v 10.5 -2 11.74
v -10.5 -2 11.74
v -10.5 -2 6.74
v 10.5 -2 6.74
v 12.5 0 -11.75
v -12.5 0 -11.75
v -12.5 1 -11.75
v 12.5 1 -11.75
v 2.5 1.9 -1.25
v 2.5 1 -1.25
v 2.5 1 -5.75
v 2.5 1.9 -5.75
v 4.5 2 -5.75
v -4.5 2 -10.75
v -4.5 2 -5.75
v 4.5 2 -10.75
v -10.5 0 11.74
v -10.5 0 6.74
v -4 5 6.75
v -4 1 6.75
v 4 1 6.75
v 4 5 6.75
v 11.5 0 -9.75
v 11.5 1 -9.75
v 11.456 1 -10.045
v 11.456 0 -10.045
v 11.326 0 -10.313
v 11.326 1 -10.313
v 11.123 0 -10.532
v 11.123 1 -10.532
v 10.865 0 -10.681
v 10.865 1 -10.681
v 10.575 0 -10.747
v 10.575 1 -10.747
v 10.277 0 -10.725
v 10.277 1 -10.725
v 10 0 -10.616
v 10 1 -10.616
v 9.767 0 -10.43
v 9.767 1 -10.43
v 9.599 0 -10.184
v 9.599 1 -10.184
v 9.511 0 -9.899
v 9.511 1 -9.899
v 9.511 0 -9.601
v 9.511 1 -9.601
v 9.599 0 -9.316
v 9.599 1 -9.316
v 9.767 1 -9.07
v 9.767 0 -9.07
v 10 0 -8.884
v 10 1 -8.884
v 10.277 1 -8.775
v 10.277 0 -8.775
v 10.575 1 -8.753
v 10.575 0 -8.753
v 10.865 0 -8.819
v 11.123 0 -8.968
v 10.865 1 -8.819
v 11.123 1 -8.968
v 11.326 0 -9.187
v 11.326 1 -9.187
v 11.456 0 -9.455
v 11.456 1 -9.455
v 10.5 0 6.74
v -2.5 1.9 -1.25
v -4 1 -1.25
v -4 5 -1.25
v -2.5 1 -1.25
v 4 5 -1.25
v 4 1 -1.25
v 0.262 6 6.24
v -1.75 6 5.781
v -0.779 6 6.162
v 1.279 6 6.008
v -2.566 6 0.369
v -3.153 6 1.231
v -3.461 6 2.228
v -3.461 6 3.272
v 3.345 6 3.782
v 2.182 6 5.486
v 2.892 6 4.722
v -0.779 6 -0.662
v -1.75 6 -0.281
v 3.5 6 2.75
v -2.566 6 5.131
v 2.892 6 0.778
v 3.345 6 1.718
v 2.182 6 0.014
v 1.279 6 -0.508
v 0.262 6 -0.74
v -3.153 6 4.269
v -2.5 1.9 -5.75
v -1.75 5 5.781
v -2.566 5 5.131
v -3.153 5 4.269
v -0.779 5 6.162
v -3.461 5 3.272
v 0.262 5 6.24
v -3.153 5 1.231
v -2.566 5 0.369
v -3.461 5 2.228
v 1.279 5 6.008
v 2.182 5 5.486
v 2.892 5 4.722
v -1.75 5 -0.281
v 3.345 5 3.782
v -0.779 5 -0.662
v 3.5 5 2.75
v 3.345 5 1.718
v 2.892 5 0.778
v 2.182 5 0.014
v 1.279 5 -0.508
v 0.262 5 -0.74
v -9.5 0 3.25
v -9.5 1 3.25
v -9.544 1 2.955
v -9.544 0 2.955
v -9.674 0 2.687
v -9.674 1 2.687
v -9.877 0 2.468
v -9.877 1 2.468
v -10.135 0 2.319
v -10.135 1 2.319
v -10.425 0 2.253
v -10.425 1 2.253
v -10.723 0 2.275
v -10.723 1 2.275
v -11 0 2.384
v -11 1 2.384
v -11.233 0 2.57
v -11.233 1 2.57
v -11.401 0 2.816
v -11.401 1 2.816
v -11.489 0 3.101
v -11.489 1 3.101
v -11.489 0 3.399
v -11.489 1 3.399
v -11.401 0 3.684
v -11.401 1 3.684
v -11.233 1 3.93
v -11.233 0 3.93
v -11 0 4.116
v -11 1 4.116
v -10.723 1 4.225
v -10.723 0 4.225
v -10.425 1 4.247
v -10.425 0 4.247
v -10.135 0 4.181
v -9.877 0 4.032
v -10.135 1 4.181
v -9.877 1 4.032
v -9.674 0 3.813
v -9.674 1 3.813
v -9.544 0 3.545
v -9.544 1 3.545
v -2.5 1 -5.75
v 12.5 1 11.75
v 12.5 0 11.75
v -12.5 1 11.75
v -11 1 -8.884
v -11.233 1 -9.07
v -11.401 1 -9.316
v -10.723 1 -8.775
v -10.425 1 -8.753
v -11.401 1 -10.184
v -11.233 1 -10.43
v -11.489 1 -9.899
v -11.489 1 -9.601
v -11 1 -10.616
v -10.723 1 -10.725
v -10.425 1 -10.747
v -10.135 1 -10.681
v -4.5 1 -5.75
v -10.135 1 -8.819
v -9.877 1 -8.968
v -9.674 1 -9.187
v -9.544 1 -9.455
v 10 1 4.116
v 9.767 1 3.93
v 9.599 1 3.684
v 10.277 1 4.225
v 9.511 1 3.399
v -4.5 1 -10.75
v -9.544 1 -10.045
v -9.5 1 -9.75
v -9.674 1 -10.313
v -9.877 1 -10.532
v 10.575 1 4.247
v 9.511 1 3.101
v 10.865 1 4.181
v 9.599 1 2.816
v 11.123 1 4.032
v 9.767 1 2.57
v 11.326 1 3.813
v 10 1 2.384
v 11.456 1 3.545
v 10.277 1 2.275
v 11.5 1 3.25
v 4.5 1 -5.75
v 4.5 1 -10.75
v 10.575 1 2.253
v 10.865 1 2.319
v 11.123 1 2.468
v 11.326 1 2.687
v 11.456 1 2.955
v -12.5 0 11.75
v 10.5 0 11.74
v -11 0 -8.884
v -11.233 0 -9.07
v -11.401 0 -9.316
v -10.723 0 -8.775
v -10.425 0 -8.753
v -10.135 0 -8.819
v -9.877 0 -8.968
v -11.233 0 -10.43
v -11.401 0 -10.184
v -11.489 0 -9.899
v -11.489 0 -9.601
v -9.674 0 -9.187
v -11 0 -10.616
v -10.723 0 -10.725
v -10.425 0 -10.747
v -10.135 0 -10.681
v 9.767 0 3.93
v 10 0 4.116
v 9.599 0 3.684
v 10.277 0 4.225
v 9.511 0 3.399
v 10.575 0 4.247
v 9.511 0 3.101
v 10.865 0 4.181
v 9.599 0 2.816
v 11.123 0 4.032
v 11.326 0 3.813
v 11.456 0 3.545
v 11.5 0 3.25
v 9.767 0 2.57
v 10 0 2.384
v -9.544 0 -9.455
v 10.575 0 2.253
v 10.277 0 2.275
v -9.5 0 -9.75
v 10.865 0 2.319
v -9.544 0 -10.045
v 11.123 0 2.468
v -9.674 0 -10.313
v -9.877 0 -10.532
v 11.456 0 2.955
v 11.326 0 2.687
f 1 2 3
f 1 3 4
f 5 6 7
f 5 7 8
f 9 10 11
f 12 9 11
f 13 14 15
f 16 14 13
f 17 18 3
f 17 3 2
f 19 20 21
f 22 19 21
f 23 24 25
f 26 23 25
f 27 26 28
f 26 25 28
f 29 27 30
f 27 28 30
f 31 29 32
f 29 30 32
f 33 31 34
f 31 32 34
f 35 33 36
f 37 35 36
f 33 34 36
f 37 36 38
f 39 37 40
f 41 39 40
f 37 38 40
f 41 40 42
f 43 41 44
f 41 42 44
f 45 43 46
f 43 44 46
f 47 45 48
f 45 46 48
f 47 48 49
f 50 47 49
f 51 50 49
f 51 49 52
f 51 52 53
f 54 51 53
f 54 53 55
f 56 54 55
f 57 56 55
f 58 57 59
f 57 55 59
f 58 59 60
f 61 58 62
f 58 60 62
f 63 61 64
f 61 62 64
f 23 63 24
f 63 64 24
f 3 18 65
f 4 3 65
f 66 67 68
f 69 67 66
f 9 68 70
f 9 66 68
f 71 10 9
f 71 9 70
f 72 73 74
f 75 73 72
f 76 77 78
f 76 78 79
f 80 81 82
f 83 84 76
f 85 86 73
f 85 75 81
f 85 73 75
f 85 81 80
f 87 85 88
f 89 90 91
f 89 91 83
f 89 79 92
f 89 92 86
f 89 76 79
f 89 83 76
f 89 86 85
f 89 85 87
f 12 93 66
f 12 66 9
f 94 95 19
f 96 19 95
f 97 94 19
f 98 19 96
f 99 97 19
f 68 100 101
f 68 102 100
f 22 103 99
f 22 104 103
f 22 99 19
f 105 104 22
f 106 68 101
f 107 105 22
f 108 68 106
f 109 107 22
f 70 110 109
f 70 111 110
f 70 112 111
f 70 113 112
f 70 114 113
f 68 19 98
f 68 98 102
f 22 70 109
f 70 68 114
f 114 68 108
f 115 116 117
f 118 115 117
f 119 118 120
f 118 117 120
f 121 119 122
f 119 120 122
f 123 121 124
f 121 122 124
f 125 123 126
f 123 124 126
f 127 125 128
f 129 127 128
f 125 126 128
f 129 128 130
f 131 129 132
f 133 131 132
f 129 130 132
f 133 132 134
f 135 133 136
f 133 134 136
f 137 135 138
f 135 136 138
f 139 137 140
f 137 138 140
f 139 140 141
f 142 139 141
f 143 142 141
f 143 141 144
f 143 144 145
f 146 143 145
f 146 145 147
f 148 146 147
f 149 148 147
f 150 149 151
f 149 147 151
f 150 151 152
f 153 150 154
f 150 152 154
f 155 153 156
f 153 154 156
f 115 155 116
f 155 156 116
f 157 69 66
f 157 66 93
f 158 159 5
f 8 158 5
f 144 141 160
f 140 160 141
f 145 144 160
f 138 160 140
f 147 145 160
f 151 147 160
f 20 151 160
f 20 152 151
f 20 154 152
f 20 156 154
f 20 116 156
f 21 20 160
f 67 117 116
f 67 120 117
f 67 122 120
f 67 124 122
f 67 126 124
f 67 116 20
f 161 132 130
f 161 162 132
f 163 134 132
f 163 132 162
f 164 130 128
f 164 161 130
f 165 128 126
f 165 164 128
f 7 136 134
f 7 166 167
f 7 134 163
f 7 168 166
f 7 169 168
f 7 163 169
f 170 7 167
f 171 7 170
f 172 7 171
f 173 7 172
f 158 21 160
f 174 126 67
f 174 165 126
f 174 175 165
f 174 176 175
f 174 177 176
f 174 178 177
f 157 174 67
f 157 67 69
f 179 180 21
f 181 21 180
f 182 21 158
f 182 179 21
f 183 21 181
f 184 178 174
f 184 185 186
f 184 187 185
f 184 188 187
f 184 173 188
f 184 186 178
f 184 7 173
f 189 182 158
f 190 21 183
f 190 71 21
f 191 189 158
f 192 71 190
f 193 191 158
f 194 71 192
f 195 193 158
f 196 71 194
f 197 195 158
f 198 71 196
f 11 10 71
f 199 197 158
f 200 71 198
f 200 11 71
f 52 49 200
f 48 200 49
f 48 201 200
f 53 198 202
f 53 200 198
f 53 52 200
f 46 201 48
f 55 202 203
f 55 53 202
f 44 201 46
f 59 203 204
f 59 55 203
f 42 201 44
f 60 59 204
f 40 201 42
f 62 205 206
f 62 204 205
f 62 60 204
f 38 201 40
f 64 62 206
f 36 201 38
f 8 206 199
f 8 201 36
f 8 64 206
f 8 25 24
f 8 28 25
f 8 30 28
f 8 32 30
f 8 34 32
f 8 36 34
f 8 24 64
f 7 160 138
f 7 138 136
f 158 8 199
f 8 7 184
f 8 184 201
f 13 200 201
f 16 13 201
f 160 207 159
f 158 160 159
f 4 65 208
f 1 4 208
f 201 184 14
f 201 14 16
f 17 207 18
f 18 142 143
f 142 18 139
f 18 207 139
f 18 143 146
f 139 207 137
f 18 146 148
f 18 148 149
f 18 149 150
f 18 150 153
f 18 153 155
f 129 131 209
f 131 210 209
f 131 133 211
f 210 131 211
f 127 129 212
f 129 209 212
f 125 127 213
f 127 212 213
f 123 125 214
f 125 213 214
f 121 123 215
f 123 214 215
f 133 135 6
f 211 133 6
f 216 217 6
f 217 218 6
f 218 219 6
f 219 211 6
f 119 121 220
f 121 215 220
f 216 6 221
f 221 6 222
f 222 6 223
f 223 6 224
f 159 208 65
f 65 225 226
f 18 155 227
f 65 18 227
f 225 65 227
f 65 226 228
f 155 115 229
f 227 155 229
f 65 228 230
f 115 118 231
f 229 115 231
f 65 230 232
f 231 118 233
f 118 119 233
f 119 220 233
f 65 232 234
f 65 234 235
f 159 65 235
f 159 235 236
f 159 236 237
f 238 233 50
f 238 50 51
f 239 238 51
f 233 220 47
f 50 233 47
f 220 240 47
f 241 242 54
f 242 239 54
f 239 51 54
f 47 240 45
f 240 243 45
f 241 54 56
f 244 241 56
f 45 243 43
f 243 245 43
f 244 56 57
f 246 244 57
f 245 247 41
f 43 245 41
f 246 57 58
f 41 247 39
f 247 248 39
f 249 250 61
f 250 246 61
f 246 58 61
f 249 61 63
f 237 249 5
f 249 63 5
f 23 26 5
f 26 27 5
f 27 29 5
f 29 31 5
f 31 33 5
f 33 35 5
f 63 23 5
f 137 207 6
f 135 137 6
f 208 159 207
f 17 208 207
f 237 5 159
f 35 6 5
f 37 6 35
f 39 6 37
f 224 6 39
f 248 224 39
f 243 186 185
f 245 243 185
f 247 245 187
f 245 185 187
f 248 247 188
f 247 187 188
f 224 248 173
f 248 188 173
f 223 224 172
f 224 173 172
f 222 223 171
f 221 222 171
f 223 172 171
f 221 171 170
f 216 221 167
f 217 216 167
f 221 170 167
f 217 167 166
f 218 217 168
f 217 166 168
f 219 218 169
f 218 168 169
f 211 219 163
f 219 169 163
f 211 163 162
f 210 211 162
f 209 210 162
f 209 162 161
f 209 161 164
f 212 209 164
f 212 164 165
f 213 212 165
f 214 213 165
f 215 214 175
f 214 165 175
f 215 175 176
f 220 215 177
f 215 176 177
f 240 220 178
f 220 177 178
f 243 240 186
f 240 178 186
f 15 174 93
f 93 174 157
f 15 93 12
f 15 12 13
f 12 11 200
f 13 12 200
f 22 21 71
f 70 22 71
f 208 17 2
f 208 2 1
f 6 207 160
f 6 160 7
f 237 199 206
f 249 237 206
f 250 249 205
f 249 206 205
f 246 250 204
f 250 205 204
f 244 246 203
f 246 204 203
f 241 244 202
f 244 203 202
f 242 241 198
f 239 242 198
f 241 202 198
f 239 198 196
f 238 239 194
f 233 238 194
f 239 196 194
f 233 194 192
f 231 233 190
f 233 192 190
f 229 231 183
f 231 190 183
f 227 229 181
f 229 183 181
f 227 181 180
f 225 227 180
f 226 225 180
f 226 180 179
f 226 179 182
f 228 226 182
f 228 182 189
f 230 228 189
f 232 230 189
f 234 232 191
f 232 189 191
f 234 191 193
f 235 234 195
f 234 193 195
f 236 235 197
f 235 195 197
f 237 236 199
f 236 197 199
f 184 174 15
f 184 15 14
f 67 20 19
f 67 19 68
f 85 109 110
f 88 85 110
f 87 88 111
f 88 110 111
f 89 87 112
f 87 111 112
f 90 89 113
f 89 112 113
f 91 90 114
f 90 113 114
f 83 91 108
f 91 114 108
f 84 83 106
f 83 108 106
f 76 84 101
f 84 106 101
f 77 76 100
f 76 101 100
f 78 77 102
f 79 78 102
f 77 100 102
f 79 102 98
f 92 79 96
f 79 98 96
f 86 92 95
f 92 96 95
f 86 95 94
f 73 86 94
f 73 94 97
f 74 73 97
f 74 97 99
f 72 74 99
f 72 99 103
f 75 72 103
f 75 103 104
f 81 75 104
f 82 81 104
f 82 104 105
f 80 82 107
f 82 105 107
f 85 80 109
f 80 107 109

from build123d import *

# Parameters (mm, degrees)
SKETCH1_W           = 25
SKETCH1_H           = 23.5
BOSS_EXTRUDE1_DEPTH = 1
SKETCH2_R           = 1
CUT_EXTRUDE1_DEPTH  = 1
SKETCH3_W           = 9
SKETCH3_H           = 5
BOSS_EXTRUDE2_DEPTH = 1
SKETCH4_W           = 5
SKETCH4_H           = 4.5
BOSS_EXTRUDE3_DEPTH = 0.9
SKETCH5_W           = 8
SKETCH5_H           = 8
BOSS_EXTRUDE4_DEPTH = 4
SKETCH6_R           = 3.5
BOSS_EXTRUDE5_DEPTH = 1
SKETCH8_W           = 21
SKETCH8_H           = 5
BOSS_EXTRUDE6_DEPTH = 2


with BuildPart() as part:
    # Sketch1 → Boss-Extrude1 (new body)
    with BuildSketch(Plane(origin=(0, 0, 0), x_dir=(1, 0, 0), z_dir=(0, 1, 0))):
        Rectangle(SKETCH1_W, SKETCH1_H)
    extrude(amount=BOSS_EXTRUDE1_DEPTH)

    # Sketch2 → Cut-Extrude1 (cut)
    with BuildSketch(Plane(origin=(0, 1, 0), x_dir=(1, 0, 0), z_dir=(0, 1, 0))):
        with Locations((-10.5, 9.75)):
            Circle(SKETCH2_R)
        with Locations((10.5, 9.75)):
            Circle(SKETCH2_R)
        with Locations((10.5, -3.25)):
            Circle(SKETCH2_R)
        with Locations((-10.5, -3.25)):
            Circle(SKETCH2_R)
    extrude(amount=-CUT_EXTRUDE1_DEPTH, mode=Mode.SUBTRACT)

    # Sketch3 → Boss-Extrude2 (add)
    with BuildSketch(Plane(origin=(0, 1, 0), x_dir=(1, 0, 0), z_dir=(0, 1, 0))):
        with Locations((0, 8.25)):
            Rectangle(SKETCH3_W, SKETCH3_H)
    extrude(amount=BOSS_EXTRUDE2_DEPTH)

    # Sketch4 → Boss-Extrude3 (add)
    with BuildSketch(Plane(origin=(0, 1, 0), x_dir=(1, 0, 0), z_dir=(0, 1, 0))):
        with Locations((0, 3.5)):
            Rectangle(SKETCH4_W, SKETCH4_H)
    extrude(amount=BOSS_EXTRUDE3_DEPTH)

    # Sketch5 → Boss-Extrude4 (add)
    with BuildSketch(Plane(origin=(0, 1, 0), x_dir=(1, 0, 0), z_dir=(0, 1, 0))):
        with Locations((0, -2.75)):
            Rectangle(SKETCH5_W, SKETCH5_H)
    extrude(amount=BOSS_EXTRUDE4_DEPTH)

    # Sketch6 → Boss-Extrude5 (add)
    with BuildSketch(Plane(origin=(0, 5, 0), x_dir=(1, 0, 0), z_dir=(0, 1, 0))):
        with Locations((0, -2.75)):
            Circle(SKETCH6_R)
    extrude(amount=BOSS_EXTRUDE5_DEPTH)

    # Sketch8 → Boss-Extrude6 (add)
    with BuildSketch(Plane.XZ):
        with Locations((0, 9.24)):
            Rectangle(SKETCH8_W, SKETCH8_H)
    extrude(amount=BOSS_EXTRUDE6_DEPTH)


solid = part.part
